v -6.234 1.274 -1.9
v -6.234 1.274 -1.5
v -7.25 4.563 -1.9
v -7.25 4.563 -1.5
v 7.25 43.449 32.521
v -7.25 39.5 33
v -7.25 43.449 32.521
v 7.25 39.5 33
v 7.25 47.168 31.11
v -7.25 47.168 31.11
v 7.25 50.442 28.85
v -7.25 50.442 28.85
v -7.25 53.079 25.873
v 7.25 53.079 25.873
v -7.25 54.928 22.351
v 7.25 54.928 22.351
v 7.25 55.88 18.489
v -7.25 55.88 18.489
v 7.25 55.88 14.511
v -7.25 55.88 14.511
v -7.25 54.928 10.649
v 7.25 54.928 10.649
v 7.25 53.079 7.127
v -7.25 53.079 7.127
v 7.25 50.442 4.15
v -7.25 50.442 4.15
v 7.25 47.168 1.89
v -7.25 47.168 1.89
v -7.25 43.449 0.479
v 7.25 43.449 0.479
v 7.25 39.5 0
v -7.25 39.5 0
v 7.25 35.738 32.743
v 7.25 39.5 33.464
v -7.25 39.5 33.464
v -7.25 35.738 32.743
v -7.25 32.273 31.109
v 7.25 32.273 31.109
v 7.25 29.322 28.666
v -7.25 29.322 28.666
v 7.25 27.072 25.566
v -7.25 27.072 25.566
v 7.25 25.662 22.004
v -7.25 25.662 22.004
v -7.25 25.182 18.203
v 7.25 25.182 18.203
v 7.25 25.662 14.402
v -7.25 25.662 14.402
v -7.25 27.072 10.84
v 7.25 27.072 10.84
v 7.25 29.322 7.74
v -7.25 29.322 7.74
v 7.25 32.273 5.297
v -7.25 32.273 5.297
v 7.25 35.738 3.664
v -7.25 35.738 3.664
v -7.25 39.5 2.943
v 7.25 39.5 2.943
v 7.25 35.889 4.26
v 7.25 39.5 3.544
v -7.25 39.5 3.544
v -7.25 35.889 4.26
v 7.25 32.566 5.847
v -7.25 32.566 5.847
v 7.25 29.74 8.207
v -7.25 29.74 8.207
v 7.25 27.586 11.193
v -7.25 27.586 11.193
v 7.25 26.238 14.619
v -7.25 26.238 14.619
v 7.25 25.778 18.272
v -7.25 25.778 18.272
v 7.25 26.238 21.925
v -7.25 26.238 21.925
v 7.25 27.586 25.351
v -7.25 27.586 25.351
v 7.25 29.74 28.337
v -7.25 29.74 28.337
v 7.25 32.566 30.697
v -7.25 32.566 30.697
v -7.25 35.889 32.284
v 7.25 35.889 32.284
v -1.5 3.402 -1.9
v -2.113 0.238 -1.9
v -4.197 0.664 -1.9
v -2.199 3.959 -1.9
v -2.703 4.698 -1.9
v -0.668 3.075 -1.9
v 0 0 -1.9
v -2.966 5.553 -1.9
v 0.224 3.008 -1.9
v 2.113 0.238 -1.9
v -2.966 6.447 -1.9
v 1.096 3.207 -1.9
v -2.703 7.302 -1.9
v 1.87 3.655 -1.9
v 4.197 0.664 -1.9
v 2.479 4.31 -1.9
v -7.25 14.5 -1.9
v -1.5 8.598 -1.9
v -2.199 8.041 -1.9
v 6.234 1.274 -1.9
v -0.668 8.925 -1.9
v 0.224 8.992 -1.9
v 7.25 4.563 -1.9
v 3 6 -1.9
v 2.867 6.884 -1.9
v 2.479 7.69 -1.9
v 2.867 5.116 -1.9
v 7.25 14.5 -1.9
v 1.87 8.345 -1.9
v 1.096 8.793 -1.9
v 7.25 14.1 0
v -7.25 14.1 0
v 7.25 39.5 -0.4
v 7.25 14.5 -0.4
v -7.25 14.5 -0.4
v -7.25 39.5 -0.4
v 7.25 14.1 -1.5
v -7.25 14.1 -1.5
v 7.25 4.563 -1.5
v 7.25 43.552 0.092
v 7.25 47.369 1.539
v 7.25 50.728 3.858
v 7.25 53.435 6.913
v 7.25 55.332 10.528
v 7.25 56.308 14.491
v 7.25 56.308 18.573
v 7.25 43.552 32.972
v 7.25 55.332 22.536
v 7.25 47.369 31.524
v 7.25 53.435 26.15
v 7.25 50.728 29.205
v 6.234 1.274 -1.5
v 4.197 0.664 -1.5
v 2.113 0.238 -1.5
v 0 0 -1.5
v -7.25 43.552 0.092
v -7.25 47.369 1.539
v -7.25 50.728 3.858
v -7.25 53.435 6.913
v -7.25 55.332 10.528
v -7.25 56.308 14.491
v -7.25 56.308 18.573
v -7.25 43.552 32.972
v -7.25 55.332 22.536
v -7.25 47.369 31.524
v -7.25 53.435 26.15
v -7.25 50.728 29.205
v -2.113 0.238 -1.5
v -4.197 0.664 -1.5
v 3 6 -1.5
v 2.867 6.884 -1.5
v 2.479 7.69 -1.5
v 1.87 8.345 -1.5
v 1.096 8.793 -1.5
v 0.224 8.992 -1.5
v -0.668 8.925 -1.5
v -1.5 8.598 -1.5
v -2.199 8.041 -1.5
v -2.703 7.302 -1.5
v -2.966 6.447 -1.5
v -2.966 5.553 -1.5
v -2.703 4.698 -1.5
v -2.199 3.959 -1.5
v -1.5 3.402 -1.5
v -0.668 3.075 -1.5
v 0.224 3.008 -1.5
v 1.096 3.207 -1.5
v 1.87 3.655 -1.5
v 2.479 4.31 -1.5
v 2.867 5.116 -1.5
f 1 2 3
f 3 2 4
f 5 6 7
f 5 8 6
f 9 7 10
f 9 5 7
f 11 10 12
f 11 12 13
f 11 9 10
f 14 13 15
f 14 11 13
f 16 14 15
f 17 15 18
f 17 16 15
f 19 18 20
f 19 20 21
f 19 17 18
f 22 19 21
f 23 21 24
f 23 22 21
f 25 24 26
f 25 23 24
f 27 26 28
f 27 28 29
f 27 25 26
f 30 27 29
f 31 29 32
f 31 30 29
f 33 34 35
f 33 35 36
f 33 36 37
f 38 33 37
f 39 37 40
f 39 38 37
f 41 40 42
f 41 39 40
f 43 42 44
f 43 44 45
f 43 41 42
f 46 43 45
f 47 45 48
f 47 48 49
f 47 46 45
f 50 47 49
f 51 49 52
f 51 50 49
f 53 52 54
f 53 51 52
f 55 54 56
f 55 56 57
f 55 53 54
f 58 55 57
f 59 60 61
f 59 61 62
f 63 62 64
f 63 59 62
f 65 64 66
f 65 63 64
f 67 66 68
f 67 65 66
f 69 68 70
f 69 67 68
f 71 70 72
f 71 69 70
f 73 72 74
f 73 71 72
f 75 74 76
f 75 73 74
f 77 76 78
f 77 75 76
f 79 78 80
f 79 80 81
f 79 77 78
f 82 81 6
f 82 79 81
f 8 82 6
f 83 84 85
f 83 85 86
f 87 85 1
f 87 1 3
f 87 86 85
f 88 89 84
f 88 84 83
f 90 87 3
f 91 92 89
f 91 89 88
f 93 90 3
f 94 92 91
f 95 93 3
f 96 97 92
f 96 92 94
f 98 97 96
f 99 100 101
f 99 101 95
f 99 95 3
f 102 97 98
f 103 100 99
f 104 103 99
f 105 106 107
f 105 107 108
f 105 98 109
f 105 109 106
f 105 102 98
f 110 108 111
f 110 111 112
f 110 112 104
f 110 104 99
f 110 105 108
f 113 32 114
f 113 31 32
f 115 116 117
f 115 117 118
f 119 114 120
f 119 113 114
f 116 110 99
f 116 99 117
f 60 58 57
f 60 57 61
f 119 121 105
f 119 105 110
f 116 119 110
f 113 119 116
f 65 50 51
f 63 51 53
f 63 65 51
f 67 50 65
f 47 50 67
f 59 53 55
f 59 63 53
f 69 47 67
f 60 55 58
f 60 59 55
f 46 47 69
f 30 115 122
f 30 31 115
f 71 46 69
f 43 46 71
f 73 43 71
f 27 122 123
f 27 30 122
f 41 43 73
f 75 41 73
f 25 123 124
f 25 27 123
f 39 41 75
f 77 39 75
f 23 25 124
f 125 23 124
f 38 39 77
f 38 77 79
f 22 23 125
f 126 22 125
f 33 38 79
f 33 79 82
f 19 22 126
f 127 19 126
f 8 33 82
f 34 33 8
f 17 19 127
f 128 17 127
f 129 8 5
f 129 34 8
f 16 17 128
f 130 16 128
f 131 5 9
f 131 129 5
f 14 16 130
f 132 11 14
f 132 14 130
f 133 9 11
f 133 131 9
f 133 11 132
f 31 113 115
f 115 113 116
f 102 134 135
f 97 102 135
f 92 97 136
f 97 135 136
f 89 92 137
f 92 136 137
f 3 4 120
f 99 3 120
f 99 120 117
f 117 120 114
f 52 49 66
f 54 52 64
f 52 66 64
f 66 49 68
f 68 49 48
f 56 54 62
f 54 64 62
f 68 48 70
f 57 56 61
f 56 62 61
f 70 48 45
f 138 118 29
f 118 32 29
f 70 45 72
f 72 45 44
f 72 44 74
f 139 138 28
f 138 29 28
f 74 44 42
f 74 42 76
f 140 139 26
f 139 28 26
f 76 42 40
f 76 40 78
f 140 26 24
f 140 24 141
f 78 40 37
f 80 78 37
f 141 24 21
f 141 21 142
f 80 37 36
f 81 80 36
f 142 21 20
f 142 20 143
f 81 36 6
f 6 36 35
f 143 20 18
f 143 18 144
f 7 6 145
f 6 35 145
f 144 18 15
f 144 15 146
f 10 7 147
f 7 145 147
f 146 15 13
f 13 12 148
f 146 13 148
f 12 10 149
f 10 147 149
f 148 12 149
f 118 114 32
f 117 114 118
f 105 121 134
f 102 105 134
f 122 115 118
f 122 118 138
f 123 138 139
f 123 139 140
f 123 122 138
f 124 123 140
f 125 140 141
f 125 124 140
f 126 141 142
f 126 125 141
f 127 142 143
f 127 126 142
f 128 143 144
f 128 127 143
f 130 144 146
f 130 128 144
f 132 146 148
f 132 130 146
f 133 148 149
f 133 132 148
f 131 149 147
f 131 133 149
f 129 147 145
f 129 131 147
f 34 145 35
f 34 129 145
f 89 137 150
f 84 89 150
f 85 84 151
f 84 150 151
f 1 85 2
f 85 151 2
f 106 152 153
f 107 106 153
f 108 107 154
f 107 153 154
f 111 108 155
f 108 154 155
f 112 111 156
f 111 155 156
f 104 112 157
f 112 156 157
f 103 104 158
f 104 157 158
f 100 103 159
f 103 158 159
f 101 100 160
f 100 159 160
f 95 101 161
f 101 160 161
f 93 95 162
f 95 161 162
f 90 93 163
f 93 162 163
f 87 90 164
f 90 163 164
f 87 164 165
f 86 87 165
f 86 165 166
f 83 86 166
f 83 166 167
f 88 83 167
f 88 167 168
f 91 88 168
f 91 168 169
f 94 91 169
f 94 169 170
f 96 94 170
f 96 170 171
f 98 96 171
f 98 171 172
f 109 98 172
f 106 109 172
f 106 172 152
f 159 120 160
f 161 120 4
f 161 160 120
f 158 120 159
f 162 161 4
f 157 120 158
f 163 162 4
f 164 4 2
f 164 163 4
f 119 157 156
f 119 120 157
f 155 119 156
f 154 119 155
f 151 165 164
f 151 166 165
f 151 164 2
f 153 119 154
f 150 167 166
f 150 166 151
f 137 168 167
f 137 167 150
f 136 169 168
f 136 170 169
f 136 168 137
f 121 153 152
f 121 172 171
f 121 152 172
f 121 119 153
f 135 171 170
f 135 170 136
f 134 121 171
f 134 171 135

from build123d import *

# Parameters (mm, degrees)
F1_DEPTH = 7.25
F2_R     = 3
F3_DEPTH = 25


with BuildPart() as f1:
    # F0 (on Right) → F1 (new body, symmetric)
    with BuildSketch(Plane.YZ):
        with BuildLine():
            Line((14.5, 0), (14.1, 0))
            Line((14.1, 0), (14.1, -0.4))
            Line((14.1, -0.4), (14.1, -1.5))
            Line((14.1, -1.5), (0, -1.5))
            Line((0, -1.5), (0, -1.9))
            Line((0, -1.9), (14.5, -1.9))
            Line((14.5, -1.9), (14.5, -0.4))
            Line((14.5, -0.4), (39.5, -0.4))
            ThreePointArc((39.5, -0.4), (56.431793, 16.531793), (39.5, 33.463586))
            ThreePointArc((39.5, 33.463586), (25.182343, 18.203119), (39.5, 2.942652))
            Line((39.5, 2.942652), (39.5, 3.544018))
            ThreePointArc((39.5, 3.544018), (25.778463, 18.272009), (39.5, 33))
            ThreePointArc((39.5, 33), (56, 16.5), (39.5, 0))
            Line((39.5, 0), (14.5, 0))
        make_face()
    extrude(amount=F1_DEPTH, both=True)

    # F2 (on face) → F3 (cut)
    with BuildSketch(Plane.XY.offset(-1.5)):
        with BuildLine():
            ThreePointArc((6.233854, 1.274401), (3.159757, 0.427693), (0, 0))
            Line((0, 0), (7.25, 0))
            Line((7.25, 0), (7.25, 4.562755))
            Line((7.25, 4.562755), (6.233854, 1.274401))
        make_face()
        with BuildLine():
            ThreePointArc((0, 0), (-3.159757, 0.427693), (-6.233854, 1.274401))
            Line((-6.233854, 1.274401), (-7.25, 4.562755))
            Line((-7.25, 4.562755), (-7.25, 0))
            Line((-7.25, 0), (0, 0))
        make_face()
        with Locations((0, 6)):
            Circle(F2_R)
    extrude(amount=-F3_DEPTH, mode=Mode.SUBTRACT)


solid = f1.part
